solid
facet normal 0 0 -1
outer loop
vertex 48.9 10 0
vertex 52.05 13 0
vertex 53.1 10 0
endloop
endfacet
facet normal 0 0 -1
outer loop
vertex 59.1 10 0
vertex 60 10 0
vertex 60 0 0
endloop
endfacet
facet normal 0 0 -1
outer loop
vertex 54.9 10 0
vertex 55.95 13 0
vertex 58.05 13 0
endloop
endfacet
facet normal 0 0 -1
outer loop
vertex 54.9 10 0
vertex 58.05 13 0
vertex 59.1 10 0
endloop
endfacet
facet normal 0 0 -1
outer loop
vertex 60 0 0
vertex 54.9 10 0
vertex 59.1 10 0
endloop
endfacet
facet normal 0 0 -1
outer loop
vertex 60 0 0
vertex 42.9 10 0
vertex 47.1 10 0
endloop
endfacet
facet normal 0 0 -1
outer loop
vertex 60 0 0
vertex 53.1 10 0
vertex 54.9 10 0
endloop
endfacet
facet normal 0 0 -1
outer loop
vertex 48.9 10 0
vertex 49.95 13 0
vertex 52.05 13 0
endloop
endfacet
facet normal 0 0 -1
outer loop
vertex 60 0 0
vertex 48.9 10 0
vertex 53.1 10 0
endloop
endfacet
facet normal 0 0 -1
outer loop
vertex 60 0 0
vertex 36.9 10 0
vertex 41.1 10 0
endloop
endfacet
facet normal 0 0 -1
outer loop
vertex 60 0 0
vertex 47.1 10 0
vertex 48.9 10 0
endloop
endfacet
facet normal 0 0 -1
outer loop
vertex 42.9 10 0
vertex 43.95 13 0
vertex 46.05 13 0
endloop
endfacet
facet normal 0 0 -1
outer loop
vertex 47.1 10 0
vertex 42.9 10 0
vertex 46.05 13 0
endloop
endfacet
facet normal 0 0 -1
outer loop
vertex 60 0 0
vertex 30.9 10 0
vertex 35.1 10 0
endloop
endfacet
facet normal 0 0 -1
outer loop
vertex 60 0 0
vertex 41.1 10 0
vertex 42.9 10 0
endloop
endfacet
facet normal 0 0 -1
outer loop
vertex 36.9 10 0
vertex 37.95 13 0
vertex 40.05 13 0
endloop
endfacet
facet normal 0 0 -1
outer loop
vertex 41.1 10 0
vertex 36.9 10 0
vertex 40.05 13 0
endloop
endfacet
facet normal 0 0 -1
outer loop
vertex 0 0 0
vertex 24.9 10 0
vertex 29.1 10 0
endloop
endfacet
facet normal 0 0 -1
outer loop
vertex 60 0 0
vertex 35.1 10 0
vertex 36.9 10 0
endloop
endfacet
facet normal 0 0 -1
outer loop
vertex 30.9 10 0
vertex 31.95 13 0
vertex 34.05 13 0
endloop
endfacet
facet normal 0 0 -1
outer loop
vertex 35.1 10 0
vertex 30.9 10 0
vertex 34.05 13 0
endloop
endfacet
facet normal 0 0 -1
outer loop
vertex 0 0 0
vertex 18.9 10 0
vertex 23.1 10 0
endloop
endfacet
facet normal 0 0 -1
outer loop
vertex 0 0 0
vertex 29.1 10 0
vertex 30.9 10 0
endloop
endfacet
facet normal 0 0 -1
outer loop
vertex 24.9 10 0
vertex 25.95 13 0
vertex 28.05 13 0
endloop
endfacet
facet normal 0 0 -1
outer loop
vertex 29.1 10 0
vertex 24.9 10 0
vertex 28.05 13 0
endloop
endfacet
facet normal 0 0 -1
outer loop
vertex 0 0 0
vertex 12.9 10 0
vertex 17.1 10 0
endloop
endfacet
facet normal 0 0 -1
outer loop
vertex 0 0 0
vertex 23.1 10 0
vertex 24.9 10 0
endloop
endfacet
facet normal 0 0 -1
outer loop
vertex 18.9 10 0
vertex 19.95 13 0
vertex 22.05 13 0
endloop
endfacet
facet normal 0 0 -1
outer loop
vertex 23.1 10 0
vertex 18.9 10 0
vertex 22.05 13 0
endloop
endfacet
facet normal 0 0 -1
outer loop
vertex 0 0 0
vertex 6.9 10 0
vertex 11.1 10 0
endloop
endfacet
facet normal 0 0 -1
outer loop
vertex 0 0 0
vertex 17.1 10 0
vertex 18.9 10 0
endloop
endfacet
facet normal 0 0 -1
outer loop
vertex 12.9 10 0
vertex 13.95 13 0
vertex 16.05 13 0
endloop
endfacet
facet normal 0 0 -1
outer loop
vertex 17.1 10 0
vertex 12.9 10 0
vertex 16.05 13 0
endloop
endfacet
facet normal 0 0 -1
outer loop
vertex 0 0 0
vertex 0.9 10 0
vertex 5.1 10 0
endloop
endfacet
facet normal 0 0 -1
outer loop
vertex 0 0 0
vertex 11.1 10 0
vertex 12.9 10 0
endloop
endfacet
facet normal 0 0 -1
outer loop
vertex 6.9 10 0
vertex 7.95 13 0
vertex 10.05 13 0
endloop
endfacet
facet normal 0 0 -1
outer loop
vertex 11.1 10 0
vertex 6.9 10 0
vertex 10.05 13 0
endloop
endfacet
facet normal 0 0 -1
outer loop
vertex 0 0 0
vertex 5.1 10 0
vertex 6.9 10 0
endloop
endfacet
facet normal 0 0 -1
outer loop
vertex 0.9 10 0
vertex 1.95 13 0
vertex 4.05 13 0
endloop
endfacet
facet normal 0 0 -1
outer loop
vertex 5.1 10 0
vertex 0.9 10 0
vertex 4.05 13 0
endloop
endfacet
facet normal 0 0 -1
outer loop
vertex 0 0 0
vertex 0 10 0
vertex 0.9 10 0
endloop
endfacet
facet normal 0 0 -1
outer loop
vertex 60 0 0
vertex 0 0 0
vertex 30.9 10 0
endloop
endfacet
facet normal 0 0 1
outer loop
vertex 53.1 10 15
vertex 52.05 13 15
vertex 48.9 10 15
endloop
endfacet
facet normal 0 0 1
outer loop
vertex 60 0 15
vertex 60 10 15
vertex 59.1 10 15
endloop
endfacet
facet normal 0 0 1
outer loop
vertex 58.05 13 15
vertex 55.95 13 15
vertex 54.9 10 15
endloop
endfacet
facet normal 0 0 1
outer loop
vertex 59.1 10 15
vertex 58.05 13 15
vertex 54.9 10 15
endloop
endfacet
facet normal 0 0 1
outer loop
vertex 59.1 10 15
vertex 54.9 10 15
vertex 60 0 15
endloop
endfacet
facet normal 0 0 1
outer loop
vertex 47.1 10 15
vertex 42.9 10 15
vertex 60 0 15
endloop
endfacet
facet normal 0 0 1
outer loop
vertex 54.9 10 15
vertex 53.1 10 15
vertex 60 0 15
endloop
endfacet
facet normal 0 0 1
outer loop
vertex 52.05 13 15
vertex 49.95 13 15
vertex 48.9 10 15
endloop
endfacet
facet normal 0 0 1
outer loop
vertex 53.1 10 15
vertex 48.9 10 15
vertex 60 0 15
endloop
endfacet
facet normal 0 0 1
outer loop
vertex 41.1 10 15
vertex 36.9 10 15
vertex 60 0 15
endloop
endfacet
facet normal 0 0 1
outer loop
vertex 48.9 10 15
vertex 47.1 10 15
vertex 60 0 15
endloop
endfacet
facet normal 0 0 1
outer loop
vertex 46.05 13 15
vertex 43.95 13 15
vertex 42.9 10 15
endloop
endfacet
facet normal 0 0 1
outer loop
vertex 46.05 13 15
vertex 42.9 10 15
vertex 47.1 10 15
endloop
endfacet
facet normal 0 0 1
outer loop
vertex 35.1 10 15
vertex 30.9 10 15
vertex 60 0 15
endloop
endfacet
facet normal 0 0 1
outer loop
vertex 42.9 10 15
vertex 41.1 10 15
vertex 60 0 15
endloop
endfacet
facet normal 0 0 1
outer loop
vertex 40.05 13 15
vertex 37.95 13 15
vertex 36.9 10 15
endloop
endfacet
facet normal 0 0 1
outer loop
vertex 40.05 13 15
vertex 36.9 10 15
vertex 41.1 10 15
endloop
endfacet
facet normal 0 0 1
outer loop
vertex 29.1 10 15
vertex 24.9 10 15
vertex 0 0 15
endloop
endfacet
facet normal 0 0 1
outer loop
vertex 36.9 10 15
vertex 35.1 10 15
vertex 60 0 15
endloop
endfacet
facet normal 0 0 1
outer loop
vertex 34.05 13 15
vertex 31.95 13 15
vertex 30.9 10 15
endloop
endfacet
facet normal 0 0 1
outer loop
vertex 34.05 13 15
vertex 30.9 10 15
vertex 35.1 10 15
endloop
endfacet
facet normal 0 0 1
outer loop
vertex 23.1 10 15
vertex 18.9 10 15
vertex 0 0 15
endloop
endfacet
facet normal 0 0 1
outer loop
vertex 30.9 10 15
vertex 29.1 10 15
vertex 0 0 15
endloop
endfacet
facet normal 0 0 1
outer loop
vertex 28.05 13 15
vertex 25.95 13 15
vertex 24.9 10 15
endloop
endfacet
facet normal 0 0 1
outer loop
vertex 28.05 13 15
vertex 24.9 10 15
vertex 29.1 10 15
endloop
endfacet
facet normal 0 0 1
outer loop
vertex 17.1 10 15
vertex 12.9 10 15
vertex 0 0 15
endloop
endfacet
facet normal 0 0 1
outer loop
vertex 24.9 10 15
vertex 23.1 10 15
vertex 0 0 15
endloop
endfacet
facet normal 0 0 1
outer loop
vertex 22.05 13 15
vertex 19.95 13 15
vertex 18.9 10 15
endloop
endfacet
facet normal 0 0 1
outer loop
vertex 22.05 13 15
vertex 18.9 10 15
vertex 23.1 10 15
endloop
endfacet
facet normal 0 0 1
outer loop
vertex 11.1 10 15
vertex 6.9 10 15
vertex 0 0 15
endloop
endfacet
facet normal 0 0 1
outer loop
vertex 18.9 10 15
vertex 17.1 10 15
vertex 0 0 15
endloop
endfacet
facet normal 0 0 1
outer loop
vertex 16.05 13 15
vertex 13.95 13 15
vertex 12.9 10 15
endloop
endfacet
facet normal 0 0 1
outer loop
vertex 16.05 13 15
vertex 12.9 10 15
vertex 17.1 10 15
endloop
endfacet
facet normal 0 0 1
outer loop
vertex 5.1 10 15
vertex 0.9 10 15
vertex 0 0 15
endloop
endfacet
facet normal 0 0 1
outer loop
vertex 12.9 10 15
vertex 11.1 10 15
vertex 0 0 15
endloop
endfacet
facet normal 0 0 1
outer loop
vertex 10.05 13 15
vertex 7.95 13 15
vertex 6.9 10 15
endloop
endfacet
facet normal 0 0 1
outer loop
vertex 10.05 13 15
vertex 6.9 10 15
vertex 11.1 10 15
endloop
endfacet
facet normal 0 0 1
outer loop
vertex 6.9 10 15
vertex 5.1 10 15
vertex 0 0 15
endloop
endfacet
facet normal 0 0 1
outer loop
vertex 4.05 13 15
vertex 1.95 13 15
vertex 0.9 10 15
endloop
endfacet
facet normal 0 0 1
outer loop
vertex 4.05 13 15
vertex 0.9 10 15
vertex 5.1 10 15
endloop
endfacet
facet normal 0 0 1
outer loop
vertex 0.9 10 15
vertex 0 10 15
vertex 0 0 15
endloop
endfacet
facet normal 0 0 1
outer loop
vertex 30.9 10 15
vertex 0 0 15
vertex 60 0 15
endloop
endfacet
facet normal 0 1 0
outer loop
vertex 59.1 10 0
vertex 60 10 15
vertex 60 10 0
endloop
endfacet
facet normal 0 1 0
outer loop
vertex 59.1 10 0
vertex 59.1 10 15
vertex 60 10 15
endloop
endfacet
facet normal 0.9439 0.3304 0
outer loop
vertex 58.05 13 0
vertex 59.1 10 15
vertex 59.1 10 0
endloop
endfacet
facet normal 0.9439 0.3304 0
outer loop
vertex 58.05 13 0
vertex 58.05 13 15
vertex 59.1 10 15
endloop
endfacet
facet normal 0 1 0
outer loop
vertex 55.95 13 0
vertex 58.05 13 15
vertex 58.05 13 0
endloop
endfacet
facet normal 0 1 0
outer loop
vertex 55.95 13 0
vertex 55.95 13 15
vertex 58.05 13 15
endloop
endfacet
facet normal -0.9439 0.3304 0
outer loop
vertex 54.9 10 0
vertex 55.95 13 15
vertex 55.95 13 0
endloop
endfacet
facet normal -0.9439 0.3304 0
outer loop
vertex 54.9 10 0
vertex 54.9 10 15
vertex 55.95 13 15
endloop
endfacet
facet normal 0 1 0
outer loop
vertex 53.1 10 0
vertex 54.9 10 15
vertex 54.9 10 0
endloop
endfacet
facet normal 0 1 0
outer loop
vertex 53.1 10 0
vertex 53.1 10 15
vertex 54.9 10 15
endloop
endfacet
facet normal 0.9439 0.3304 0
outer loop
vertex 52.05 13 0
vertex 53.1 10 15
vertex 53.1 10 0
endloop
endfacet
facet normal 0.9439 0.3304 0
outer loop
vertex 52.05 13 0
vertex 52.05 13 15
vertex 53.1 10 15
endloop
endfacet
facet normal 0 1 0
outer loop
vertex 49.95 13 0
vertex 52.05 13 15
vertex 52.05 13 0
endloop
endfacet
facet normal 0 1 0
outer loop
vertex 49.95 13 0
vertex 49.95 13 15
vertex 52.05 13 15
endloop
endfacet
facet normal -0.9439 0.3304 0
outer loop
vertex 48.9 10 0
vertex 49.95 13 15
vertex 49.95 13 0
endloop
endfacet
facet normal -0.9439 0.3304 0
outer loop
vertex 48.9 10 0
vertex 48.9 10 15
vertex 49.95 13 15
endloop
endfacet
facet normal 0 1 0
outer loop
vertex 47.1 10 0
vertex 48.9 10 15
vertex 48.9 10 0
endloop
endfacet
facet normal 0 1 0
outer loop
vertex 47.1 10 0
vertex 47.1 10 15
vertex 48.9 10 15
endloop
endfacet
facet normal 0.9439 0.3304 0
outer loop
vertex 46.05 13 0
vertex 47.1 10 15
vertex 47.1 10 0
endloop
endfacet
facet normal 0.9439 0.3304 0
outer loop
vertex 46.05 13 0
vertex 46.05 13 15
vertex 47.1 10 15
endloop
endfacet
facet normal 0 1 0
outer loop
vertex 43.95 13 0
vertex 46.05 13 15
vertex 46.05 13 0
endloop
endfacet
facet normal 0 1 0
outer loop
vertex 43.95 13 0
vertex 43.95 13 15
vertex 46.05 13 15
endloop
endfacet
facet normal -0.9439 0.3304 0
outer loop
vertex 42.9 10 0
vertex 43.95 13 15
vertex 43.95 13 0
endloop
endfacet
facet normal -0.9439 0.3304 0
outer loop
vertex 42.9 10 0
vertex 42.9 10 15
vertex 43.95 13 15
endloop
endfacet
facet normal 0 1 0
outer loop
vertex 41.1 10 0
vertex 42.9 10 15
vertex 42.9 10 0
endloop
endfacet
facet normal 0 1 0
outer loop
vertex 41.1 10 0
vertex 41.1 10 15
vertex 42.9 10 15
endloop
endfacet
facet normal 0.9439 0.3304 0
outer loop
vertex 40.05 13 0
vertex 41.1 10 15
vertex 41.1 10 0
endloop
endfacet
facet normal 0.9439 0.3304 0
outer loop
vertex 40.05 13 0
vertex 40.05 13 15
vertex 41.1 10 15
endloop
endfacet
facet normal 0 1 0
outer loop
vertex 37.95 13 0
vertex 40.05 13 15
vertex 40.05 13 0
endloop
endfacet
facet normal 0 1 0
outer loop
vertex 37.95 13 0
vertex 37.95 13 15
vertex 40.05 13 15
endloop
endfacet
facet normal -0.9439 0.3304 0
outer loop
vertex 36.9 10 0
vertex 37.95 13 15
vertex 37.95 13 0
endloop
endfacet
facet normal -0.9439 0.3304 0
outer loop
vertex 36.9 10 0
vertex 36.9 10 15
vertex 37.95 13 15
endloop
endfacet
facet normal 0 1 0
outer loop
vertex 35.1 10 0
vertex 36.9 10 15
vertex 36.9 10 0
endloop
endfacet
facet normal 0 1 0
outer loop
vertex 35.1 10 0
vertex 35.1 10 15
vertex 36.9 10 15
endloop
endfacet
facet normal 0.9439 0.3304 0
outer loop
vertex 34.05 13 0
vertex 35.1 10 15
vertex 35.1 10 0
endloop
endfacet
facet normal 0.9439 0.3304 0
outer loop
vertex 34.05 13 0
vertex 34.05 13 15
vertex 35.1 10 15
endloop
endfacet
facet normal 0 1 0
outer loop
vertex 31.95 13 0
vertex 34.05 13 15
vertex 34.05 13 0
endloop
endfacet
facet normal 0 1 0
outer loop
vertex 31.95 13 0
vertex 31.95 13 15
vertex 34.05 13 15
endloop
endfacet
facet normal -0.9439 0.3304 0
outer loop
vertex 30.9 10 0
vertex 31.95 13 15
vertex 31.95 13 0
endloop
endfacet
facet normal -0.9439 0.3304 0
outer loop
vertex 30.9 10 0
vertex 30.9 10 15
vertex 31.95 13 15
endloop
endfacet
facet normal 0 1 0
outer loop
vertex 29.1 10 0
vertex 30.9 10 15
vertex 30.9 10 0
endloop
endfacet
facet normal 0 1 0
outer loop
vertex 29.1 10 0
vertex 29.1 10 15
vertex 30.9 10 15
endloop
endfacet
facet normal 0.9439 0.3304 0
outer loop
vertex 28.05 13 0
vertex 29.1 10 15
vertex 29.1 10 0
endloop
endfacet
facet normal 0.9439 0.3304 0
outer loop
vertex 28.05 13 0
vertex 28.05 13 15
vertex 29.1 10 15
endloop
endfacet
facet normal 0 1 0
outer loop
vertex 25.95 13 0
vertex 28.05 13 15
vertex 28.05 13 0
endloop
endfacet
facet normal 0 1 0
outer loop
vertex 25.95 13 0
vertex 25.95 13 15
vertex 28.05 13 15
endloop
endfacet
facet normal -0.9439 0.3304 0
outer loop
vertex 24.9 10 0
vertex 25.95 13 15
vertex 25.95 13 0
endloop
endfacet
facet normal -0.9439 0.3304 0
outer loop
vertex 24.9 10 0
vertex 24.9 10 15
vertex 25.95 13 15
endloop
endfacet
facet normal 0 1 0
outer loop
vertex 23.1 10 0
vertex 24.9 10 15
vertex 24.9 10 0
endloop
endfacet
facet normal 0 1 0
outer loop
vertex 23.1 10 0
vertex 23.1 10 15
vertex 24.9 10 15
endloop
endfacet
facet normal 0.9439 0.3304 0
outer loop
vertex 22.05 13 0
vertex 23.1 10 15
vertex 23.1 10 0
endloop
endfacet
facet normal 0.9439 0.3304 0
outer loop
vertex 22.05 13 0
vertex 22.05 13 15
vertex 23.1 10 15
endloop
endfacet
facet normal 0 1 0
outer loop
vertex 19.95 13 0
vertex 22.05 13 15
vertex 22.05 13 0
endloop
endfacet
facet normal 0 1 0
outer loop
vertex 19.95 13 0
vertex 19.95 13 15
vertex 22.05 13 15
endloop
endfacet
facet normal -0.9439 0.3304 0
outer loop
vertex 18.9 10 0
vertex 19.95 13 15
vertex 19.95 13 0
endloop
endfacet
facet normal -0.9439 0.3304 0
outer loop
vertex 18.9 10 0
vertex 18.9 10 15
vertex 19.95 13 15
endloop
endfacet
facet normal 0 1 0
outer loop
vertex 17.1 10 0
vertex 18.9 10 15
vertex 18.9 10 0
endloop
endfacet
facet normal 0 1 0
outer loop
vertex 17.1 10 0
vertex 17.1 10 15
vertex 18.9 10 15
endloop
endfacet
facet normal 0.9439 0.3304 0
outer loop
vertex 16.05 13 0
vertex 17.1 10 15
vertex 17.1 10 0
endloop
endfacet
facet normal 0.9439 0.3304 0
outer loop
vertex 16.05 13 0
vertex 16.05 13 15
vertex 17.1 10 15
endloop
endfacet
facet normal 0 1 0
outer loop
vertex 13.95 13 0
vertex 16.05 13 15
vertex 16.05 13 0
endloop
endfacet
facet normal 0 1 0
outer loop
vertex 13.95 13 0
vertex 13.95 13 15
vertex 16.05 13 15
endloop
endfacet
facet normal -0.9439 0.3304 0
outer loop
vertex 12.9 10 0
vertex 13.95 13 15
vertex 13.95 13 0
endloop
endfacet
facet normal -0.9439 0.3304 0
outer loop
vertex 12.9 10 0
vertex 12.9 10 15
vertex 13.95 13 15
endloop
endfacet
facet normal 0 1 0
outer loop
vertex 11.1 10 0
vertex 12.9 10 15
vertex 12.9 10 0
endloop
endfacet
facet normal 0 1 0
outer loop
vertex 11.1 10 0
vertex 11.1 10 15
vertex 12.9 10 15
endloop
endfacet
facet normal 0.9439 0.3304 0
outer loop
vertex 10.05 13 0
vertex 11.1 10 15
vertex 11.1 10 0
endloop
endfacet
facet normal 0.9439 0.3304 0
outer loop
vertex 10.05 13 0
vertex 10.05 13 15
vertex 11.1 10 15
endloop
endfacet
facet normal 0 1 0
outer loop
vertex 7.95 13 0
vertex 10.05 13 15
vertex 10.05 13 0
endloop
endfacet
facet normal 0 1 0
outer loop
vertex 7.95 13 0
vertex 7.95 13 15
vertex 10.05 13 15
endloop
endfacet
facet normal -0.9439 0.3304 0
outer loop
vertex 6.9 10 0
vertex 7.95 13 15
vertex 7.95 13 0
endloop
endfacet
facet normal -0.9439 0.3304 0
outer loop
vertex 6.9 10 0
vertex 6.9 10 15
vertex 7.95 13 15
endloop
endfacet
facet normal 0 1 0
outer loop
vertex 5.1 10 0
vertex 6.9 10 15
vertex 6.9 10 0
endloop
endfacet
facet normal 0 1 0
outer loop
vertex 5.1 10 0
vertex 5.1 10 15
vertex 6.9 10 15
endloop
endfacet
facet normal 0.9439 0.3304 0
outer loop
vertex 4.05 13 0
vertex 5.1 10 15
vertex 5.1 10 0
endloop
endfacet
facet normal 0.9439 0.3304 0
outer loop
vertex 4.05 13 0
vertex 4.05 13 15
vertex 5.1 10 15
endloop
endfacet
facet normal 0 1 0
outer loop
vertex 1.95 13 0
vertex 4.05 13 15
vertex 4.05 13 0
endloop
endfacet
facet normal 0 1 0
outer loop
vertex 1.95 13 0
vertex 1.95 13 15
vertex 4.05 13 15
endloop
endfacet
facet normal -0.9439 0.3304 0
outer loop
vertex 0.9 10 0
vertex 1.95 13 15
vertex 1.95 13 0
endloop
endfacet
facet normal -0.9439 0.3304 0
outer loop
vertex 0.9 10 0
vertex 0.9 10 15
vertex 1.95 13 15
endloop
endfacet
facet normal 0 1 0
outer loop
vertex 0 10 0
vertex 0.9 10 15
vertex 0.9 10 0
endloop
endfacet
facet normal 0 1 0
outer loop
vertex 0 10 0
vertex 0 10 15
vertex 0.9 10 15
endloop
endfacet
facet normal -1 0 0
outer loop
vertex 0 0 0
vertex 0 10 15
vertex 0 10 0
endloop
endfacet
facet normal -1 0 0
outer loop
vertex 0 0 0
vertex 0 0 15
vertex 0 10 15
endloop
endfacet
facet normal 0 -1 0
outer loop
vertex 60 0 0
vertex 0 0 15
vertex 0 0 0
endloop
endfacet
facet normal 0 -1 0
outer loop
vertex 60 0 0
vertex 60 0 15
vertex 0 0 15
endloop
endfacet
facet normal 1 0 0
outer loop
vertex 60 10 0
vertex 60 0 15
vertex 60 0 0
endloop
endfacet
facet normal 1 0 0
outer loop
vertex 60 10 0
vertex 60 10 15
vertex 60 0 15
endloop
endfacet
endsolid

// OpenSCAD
$fn = 32;

// ----------------------------------------------------------------------
// Gear rack: 10 teeth, pitch 6 mm
// ----------------------------------------------------------------------

// --- parameters (mm) ---
teeth = 10;               // number of teeth
pitch = 6;                // tooth pitch, X
root_w = 4.2;             // tooth width at the root
tip_w = 2.1;              // tooth width at the tip
base_h = 10;              // rack body height, Y
tooth_h = 3;              // tooth height above the body
plate_t = 15;             // rack width, Z (extrusion height)

rack_l = teeth * pitch;  // overall length
total_h = base_h + tooth_h;  // overall height

profile = [[0, 0], [60, 0], [60, 10], [59.1, 10], [58.05, 13], [55.95, 13], [54.9, 10], [53.1, 10], [52.05, 13], [49.95, 13], [48.9, 10], [47.1, 10], [46.05, 13], [43.95, 13], [42.9, 10], [41.1, 10], [40.05, 13], [37.95, 13], [36.9, 10], [35.1, 10], [34.05, 13], [31.95, 13], [30.9, 10], [29.1, 10], [28.05, 13], [25.95, 13], [24.9, 10], [23.1, 10], [22.05, 13], [19.95, 13], [18.9, 10], [17.1, 10], [16.05, 13], [13.95, 13], [12.9, 10], [11.1, 10], [10.05, 13], [7.95, 13], [6.9, 10], [5.1, 10], [4.05, 13], [1.95, 13], [0.9, 10], [0, 10]];  // primary outline, 44 points, counter clockwise

// --- the one profile operation ---
linear_extrude(height = plate_t) polygon(points = profile);
